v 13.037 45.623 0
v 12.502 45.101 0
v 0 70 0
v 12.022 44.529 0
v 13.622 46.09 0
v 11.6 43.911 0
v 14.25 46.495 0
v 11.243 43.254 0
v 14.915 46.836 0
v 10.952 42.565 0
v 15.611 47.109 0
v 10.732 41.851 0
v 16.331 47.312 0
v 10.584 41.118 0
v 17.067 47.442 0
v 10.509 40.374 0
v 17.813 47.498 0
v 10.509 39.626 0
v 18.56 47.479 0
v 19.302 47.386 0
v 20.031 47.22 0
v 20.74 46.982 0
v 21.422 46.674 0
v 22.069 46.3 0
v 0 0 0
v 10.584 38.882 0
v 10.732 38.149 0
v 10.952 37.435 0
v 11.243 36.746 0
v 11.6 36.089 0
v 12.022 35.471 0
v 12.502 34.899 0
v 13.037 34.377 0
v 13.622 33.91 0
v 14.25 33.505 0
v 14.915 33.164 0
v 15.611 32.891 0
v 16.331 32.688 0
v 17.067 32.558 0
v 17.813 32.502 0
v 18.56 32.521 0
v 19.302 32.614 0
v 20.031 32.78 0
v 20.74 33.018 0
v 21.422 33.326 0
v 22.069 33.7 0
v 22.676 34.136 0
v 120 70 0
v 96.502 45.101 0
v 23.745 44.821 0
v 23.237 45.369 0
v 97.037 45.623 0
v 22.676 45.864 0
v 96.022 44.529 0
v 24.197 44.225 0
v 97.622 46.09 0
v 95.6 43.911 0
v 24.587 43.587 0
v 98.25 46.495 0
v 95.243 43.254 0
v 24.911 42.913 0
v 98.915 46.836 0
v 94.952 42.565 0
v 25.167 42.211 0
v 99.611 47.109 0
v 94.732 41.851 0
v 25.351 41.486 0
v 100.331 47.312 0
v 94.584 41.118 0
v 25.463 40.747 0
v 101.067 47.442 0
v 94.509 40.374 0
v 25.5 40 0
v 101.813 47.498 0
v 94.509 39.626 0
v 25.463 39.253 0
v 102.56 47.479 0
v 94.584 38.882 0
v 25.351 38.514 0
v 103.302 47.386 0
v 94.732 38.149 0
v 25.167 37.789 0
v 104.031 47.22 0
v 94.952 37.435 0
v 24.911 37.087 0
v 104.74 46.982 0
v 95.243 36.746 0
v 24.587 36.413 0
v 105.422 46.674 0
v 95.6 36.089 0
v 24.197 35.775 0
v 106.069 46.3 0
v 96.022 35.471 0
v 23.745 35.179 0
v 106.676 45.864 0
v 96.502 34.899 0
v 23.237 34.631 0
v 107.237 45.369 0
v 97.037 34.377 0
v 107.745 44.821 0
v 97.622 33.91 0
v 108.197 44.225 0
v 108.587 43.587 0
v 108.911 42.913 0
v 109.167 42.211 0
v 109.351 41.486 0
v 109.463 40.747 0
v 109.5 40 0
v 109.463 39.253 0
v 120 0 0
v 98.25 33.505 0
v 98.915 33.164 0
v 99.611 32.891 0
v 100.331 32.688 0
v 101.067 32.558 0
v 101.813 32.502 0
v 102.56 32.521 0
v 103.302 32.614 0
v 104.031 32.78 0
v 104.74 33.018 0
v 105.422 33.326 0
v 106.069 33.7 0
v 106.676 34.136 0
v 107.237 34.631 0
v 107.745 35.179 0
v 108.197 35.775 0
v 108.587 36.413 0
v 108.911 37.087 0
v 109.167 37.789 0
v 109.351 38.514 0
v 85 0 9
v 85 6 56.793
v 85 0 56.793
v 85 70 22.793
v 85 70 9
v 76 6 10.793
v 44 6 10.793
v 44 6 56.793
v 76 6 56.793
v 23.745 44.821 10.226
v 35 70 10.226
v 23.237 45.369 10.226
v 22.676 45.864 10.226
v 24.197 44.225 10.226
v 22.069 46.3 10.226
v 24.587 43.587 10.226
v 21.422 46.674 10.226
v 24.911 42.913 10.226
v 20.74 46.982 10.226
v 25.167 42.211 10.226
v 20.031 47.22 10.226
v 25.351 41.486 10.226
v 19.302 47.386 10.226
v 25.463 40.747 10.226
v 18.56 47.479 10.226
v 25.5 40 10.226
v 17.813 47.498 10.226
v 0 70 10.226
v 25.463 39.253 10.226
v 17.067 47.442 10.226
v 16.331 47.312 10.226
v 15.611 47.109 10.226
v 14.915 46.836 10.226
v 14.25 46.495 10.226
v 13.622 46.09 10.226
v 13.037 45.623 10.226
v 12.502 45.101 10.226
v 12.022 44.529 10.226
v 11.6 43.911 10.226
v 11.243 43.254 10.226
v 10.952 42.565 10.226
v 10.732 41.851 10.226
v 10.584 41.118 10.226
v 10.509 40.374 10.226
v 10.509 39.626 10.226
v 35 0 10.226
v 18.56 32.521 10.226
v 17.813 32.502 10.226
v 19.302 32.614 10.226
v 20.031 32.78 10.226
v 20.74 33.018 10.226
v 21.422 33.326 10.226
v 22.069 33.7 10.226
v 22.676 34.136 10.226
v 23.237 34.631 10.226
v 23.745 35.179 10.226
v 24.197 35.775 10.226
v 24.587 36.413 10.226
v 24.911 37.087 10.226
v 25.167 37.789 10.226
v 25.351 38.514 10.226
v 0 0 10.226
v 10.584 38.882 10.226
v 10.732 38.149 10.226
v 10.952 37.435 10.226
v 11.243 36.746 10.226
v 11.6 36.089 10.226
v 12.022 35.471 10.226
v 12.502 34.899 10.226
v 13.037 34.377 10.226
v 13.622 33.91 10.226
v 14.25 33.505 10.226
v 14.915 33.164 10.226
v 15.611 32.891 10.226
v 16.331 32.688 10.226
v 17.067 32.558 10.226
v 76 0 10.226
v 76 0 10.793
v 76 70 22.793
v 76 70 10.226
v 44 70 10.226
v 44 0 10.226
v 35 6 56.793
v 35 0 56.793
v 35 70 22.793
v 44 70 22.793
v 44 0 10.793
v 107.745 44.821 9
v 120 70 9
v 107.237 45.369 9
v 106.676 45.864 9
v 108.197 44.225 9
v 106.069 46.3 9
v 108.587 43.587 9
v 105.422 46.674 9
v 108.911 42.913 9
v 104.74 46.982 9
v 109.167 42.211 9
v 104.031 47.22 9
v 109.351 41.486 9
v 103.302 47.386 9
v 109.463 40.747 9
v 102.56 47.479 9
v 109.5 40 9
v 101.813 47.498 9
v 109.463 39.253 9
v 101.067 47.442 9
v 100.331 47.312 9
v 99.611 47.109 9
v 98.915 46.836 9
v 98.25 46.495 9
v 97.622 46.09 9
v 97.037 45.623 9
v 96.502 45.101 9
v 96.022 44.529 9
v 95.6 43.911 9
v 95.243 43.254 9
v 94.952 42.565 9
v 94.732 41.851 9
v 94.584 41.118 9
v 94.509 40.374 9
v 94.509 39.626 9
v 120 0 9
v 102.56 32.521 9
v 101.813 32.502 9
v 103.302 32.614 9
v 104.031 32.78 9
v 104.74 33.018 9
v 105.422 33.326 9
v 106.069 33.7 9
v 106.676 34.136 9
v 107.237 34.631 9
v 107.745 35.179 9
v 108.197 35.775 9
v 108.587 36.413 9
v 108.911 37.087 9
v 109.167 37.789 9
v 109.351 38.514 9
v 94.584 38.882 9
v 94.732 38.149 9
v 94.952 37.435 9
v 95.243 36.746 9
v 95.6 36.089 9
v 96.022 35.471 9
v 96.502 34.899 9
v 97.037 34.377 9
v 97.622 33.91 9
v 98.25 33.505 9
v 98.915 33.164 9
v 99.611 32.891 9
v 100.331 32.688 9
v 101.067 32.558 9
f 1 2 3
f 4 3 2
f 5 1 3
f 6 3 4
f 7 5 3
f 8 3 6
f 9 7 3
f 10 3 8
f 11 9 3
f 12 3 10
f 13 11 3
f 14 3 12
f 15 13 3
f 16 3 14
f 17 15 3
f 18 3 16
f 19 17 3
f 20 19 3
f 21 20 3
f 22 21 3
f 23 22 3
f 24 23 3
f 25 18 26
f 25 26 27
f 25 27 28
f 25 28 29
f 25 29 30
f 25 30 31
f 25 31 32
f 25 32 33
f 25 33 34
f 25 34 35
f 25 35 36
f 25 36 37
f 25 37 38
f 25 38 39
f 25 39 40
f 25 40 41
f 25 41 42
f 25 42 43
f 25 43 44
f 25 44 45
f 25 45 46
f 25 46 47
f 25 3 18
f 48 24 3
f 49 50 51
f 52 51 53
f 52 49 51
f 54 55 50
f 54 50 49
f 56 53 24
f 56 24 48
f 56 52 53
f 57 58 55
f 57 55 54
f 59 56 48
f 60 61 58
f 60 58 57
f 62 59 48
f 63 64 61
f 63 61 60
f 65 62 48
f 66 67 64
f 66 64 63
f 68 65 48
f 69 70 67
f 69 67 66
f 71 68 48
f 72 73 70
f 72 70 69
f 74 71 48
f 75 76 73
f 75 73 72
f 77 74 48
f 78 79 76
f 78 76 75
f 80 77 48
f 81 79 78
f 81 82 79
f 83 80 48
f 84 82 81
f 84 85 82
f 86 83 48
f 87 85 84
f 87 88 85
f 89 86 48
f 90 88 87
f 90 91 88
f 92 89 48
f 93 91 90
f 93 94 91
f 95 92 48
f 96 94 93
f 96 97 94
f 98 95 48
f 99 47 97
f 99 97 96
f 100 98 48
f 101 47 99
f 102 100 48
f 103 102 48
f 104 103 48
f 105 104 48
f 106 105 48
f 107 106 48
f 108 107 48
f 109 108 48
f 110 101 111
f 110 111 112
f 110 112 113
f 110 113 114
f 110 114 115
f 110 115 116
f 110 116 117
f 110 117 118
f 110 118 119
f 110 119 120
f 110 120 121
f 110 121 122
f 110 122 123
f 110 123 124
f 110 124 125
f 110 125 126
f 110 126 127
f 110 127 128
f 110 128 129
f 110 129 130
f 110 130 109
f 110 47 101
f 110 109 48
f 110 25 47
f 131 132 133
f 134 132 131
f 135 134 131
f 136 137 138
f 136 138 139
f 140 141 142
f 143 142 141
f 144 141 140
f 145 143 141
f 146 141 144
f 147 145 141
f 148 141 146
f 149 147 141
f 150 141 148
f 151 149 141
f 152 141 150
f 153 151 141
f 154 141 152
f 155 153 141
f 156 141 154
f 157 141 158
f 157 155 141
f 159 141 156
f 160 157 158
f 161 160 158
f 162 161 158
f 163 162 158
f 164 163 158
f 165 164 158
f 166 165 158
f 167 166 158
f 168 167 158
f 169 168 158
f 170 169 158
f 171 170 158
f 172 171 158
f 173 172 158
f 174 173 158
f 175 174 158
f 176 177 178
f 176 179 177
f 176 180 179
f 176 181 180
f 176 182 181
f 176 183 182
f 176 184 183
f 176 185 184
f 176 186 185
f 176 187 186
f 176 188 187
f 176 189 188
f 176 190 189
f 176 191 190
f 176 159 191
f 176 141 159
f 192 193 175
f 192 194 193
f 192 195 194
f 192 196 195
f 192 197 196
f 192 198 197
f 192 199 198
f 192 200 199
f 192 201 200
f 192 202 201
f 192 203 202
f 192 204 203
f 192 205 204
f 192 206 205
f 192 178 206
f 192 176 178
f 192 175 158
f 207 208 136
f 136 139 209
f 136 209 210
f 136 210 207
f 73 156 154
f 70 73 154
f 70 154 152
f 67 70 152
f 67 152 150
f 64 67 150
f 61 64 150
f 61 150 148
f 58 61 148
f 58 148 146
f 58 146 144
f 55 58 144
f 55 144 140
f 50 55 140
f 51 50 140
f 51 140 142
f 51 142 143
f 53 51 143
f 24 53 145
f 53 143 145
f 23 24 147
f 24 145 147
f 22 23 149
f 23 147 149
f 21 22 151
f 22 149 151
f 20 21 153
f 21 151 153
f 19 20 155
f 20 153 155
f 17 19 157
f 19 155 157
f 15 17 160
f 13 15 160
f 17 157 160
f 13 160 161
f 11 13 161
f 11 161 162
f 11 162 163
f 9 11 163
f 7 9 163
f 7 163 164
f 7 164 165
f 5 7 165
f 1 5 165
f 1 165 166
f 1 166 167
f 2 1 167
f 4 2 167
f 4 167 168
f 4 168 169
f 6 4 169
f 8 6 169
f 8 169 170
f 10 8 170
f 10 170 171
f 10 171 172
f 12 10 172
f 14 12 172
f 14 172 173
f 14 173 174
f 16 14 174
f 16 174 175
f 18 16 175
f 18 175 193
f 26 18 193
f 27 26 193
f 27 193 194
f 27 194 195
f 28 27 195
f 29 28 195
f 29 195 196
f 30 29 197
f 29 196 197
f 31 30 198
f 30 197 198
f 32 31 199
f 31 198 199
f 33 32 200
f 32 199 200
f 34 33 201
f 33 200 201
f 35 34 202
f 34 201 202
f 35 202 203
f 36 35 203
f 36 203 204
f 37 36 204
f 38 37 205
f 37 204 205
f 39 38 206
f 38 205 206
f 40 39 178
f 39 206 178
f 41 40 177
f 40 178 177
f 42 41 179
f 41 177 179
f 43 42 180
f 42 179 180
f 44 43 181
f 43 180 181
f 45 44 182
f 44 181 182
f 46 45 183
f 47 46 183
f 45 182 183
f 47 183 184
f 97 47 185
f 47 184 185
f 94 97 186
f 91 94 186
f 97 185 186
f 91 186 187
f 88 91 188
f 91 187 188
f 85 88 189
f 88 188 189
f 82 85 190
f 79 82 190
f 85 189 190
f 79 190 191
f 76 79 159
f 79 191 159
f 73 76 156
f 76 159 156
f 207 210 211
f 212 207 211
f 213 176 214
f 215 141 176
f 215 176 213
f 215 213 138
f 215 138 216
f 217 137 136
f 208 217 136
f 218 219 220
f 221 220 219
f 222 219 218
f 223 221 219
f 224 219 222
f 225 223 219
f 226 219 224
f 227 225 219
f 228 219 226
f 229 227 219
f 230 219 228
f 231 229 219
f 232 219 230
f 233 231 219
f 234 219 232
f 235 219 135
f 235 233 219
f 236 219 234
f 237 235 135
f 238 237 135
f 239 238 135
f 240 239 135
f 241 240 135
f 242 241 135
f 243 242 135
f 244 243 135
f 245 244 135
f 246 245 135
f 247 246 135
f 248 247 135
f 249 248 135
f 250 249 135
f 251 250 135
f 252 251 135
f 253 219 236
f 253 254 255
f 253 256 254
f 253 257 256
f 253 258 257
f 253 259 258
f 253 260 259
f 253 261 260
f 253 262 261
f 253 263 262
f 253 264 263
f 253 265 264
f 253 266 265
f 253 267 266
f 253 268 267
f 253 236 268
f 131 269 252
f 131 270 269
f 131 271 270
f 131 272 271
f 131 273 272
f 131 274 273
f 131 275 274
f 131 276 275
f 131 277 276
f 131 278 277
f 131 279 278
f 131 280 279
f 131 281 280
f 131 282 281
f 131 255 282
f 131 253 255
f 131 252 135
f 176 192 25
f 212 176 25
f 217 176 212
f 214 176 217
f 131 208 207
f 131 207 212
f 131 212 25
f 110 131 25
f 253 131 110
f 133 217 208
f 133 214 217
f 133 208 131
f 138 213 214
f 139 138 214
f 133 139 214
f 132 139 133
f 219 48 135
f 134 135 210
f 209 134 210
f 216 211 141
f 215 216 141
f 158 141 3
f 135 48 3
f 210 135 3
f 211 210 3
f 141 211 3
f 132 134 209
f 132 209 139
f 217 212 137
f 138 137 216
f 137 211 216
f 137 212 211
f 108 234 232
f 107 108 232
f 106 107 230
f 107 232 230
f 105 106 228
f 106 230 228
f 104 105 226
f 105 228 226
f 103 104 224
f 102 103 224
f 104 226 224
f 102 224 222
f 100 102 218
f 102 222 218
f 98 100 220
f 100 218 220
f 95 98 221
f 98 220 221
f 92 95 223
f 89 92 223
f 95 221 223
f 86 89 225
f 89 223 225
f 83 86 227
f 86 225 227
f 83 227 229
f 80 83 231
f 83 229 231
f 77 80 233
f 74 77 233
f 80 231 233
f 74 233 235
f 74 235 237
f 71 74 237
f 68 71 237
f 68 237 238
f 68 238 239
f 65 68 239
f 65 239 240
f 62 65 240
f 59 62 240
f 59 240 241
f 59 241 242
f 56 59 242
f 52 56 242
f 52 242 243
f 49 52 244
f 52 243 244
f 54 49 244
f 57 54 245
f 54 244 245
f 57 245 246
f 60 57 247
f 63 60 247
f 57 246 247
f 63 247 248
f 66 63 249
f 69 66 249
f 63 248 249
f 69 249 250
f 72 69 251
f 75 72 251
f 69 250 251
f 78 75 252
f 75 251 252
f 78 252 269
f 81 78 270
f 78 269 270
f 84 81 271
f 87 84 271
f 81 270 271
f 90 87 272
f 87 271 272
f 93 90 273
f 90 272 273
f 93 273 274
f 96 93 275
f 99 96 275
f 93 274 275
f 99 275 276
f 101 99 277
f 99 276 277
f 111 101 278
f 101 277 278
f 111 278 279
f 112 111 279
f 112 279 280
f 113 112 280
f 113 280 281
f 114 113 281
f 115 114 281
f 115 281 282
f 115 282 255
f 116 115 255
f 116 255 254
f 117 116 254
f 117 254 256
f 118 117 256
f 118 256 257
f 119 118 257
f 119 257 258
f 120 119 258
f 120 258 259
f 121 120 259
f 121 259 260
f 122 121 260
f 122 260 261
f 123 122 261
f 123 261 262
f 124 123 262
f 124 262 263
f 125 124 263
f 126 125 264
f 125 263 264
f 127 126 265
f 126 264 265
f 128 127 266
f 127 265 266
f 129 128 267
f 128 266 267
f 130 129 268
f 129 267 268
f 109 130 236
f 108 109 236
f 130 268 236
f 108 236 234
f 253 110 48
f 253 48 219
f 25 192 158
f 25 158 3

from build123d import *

# Parameters (mm, degrees)
BOSS_EXTRUDE1_DEPTH = 70
SKETCH2_R           = 7.5
CUT_EXTRUDE1_DEPTH  = 9
SKETCH3_R           = 7.5
CUT_EXTRUDE2_DEPTH  = 9
BOSS_EXTRUDE7_DEPTH = 9
BOSS_EXTRUDE8_DEPTH = 9
SKETCH8_W           = 32
SKETCH8_H           = 6
BOSS_EXTRUDE9_DEPTH = 46
SKETCH10_R          = 7.5
CUT_EXTRUDE3_DEPTH  = 46


with BuildPart() as part:
    # Sketch1 → Boss-Extrude1 (new body)
    with BuildSketch(Plane(origin=(0, 0, 0), x_dir=(1, 0, 0), z_dir=(0, 1, 0))):
        Polygon((0, 0), (120, 0), (120, -9), (85, -9), (85, -22.792607803), (76, -22.792607803), (76, -10.22587269), (44, -10.22587269), (44, -22.792607803), (35, -22.792607803), (35, -10.22587269), (0, -10.22587269), align=None)
    extrude(amount=BOSS_EXTRUDE1_DEPTH)

    # Sketch2 → Cut-Extrude1 (cut)
    with BuildSketch(Plane.XY.offset(9)):
        with Locations((102, 40)):
            Circle(SKETCH2_R)
    extrude(amount=-CUT_EXTRUDE1_DEPTH, mode=Mode.SUBTRACT)

    # Sketch3 → Cut-Extrude2 (cut)
    with BuildSketch(Plane.XY.offset(10.22587269)):
        with Locations((18, 40)):
            Circle(SKETCH3_R)
    extrude(amount=-CUT_EXTRUDE2_DEPTH, mode=Mode.SUBTRACT)

    # Sketch4 → Boss-Extrude7 (add)
    with BuildSketch(Plane(origin=(85, 0, 0), x_dir=(0, 0, -1), z_dir=(1, 0, 0))):
        Polygon((-56.792607803, 0), (-22.792607803, 0), (-22.792607803, 70), (-56.792607803, 6), align=None)
    extrude(amount=-BOSS_EXTRUDE7_DEPTH)

    # Sketch7 → Boss-Extrude8 (add)
    with BuildSketch(Plane.ZY.offset(-35)):
        Polygon((22.792607803, 0), (56.792607803, 0), (56.792607803, 6), (22.792607803, 70), align=None)
    extrude(amount=-BOSS_EXTRUDE8_DEPTH)

    # Sketch8 → Boss-Extrude9 (add)
    with BuildSketch(Plane.XY.offset(56.792607803)):
        with Locations((60, 3)):
            Rectangle(SKETCH8_W, SKETCH8_H)
    extrude(amount=-BOSS_EXTRUDE9_DEPTH)

    # Sketch10 → Cut-Extrude3 (cut)
    with BuildSketch(Plane.XY.offset(1.22587269)):
        with Locations((18, 40)):
            Circle(SKETCH10_R)
    extrude(amount=-CUT_EXTRUDE3_DEPTH, mode=Mode.SUBTRACT)


solid = part.part
